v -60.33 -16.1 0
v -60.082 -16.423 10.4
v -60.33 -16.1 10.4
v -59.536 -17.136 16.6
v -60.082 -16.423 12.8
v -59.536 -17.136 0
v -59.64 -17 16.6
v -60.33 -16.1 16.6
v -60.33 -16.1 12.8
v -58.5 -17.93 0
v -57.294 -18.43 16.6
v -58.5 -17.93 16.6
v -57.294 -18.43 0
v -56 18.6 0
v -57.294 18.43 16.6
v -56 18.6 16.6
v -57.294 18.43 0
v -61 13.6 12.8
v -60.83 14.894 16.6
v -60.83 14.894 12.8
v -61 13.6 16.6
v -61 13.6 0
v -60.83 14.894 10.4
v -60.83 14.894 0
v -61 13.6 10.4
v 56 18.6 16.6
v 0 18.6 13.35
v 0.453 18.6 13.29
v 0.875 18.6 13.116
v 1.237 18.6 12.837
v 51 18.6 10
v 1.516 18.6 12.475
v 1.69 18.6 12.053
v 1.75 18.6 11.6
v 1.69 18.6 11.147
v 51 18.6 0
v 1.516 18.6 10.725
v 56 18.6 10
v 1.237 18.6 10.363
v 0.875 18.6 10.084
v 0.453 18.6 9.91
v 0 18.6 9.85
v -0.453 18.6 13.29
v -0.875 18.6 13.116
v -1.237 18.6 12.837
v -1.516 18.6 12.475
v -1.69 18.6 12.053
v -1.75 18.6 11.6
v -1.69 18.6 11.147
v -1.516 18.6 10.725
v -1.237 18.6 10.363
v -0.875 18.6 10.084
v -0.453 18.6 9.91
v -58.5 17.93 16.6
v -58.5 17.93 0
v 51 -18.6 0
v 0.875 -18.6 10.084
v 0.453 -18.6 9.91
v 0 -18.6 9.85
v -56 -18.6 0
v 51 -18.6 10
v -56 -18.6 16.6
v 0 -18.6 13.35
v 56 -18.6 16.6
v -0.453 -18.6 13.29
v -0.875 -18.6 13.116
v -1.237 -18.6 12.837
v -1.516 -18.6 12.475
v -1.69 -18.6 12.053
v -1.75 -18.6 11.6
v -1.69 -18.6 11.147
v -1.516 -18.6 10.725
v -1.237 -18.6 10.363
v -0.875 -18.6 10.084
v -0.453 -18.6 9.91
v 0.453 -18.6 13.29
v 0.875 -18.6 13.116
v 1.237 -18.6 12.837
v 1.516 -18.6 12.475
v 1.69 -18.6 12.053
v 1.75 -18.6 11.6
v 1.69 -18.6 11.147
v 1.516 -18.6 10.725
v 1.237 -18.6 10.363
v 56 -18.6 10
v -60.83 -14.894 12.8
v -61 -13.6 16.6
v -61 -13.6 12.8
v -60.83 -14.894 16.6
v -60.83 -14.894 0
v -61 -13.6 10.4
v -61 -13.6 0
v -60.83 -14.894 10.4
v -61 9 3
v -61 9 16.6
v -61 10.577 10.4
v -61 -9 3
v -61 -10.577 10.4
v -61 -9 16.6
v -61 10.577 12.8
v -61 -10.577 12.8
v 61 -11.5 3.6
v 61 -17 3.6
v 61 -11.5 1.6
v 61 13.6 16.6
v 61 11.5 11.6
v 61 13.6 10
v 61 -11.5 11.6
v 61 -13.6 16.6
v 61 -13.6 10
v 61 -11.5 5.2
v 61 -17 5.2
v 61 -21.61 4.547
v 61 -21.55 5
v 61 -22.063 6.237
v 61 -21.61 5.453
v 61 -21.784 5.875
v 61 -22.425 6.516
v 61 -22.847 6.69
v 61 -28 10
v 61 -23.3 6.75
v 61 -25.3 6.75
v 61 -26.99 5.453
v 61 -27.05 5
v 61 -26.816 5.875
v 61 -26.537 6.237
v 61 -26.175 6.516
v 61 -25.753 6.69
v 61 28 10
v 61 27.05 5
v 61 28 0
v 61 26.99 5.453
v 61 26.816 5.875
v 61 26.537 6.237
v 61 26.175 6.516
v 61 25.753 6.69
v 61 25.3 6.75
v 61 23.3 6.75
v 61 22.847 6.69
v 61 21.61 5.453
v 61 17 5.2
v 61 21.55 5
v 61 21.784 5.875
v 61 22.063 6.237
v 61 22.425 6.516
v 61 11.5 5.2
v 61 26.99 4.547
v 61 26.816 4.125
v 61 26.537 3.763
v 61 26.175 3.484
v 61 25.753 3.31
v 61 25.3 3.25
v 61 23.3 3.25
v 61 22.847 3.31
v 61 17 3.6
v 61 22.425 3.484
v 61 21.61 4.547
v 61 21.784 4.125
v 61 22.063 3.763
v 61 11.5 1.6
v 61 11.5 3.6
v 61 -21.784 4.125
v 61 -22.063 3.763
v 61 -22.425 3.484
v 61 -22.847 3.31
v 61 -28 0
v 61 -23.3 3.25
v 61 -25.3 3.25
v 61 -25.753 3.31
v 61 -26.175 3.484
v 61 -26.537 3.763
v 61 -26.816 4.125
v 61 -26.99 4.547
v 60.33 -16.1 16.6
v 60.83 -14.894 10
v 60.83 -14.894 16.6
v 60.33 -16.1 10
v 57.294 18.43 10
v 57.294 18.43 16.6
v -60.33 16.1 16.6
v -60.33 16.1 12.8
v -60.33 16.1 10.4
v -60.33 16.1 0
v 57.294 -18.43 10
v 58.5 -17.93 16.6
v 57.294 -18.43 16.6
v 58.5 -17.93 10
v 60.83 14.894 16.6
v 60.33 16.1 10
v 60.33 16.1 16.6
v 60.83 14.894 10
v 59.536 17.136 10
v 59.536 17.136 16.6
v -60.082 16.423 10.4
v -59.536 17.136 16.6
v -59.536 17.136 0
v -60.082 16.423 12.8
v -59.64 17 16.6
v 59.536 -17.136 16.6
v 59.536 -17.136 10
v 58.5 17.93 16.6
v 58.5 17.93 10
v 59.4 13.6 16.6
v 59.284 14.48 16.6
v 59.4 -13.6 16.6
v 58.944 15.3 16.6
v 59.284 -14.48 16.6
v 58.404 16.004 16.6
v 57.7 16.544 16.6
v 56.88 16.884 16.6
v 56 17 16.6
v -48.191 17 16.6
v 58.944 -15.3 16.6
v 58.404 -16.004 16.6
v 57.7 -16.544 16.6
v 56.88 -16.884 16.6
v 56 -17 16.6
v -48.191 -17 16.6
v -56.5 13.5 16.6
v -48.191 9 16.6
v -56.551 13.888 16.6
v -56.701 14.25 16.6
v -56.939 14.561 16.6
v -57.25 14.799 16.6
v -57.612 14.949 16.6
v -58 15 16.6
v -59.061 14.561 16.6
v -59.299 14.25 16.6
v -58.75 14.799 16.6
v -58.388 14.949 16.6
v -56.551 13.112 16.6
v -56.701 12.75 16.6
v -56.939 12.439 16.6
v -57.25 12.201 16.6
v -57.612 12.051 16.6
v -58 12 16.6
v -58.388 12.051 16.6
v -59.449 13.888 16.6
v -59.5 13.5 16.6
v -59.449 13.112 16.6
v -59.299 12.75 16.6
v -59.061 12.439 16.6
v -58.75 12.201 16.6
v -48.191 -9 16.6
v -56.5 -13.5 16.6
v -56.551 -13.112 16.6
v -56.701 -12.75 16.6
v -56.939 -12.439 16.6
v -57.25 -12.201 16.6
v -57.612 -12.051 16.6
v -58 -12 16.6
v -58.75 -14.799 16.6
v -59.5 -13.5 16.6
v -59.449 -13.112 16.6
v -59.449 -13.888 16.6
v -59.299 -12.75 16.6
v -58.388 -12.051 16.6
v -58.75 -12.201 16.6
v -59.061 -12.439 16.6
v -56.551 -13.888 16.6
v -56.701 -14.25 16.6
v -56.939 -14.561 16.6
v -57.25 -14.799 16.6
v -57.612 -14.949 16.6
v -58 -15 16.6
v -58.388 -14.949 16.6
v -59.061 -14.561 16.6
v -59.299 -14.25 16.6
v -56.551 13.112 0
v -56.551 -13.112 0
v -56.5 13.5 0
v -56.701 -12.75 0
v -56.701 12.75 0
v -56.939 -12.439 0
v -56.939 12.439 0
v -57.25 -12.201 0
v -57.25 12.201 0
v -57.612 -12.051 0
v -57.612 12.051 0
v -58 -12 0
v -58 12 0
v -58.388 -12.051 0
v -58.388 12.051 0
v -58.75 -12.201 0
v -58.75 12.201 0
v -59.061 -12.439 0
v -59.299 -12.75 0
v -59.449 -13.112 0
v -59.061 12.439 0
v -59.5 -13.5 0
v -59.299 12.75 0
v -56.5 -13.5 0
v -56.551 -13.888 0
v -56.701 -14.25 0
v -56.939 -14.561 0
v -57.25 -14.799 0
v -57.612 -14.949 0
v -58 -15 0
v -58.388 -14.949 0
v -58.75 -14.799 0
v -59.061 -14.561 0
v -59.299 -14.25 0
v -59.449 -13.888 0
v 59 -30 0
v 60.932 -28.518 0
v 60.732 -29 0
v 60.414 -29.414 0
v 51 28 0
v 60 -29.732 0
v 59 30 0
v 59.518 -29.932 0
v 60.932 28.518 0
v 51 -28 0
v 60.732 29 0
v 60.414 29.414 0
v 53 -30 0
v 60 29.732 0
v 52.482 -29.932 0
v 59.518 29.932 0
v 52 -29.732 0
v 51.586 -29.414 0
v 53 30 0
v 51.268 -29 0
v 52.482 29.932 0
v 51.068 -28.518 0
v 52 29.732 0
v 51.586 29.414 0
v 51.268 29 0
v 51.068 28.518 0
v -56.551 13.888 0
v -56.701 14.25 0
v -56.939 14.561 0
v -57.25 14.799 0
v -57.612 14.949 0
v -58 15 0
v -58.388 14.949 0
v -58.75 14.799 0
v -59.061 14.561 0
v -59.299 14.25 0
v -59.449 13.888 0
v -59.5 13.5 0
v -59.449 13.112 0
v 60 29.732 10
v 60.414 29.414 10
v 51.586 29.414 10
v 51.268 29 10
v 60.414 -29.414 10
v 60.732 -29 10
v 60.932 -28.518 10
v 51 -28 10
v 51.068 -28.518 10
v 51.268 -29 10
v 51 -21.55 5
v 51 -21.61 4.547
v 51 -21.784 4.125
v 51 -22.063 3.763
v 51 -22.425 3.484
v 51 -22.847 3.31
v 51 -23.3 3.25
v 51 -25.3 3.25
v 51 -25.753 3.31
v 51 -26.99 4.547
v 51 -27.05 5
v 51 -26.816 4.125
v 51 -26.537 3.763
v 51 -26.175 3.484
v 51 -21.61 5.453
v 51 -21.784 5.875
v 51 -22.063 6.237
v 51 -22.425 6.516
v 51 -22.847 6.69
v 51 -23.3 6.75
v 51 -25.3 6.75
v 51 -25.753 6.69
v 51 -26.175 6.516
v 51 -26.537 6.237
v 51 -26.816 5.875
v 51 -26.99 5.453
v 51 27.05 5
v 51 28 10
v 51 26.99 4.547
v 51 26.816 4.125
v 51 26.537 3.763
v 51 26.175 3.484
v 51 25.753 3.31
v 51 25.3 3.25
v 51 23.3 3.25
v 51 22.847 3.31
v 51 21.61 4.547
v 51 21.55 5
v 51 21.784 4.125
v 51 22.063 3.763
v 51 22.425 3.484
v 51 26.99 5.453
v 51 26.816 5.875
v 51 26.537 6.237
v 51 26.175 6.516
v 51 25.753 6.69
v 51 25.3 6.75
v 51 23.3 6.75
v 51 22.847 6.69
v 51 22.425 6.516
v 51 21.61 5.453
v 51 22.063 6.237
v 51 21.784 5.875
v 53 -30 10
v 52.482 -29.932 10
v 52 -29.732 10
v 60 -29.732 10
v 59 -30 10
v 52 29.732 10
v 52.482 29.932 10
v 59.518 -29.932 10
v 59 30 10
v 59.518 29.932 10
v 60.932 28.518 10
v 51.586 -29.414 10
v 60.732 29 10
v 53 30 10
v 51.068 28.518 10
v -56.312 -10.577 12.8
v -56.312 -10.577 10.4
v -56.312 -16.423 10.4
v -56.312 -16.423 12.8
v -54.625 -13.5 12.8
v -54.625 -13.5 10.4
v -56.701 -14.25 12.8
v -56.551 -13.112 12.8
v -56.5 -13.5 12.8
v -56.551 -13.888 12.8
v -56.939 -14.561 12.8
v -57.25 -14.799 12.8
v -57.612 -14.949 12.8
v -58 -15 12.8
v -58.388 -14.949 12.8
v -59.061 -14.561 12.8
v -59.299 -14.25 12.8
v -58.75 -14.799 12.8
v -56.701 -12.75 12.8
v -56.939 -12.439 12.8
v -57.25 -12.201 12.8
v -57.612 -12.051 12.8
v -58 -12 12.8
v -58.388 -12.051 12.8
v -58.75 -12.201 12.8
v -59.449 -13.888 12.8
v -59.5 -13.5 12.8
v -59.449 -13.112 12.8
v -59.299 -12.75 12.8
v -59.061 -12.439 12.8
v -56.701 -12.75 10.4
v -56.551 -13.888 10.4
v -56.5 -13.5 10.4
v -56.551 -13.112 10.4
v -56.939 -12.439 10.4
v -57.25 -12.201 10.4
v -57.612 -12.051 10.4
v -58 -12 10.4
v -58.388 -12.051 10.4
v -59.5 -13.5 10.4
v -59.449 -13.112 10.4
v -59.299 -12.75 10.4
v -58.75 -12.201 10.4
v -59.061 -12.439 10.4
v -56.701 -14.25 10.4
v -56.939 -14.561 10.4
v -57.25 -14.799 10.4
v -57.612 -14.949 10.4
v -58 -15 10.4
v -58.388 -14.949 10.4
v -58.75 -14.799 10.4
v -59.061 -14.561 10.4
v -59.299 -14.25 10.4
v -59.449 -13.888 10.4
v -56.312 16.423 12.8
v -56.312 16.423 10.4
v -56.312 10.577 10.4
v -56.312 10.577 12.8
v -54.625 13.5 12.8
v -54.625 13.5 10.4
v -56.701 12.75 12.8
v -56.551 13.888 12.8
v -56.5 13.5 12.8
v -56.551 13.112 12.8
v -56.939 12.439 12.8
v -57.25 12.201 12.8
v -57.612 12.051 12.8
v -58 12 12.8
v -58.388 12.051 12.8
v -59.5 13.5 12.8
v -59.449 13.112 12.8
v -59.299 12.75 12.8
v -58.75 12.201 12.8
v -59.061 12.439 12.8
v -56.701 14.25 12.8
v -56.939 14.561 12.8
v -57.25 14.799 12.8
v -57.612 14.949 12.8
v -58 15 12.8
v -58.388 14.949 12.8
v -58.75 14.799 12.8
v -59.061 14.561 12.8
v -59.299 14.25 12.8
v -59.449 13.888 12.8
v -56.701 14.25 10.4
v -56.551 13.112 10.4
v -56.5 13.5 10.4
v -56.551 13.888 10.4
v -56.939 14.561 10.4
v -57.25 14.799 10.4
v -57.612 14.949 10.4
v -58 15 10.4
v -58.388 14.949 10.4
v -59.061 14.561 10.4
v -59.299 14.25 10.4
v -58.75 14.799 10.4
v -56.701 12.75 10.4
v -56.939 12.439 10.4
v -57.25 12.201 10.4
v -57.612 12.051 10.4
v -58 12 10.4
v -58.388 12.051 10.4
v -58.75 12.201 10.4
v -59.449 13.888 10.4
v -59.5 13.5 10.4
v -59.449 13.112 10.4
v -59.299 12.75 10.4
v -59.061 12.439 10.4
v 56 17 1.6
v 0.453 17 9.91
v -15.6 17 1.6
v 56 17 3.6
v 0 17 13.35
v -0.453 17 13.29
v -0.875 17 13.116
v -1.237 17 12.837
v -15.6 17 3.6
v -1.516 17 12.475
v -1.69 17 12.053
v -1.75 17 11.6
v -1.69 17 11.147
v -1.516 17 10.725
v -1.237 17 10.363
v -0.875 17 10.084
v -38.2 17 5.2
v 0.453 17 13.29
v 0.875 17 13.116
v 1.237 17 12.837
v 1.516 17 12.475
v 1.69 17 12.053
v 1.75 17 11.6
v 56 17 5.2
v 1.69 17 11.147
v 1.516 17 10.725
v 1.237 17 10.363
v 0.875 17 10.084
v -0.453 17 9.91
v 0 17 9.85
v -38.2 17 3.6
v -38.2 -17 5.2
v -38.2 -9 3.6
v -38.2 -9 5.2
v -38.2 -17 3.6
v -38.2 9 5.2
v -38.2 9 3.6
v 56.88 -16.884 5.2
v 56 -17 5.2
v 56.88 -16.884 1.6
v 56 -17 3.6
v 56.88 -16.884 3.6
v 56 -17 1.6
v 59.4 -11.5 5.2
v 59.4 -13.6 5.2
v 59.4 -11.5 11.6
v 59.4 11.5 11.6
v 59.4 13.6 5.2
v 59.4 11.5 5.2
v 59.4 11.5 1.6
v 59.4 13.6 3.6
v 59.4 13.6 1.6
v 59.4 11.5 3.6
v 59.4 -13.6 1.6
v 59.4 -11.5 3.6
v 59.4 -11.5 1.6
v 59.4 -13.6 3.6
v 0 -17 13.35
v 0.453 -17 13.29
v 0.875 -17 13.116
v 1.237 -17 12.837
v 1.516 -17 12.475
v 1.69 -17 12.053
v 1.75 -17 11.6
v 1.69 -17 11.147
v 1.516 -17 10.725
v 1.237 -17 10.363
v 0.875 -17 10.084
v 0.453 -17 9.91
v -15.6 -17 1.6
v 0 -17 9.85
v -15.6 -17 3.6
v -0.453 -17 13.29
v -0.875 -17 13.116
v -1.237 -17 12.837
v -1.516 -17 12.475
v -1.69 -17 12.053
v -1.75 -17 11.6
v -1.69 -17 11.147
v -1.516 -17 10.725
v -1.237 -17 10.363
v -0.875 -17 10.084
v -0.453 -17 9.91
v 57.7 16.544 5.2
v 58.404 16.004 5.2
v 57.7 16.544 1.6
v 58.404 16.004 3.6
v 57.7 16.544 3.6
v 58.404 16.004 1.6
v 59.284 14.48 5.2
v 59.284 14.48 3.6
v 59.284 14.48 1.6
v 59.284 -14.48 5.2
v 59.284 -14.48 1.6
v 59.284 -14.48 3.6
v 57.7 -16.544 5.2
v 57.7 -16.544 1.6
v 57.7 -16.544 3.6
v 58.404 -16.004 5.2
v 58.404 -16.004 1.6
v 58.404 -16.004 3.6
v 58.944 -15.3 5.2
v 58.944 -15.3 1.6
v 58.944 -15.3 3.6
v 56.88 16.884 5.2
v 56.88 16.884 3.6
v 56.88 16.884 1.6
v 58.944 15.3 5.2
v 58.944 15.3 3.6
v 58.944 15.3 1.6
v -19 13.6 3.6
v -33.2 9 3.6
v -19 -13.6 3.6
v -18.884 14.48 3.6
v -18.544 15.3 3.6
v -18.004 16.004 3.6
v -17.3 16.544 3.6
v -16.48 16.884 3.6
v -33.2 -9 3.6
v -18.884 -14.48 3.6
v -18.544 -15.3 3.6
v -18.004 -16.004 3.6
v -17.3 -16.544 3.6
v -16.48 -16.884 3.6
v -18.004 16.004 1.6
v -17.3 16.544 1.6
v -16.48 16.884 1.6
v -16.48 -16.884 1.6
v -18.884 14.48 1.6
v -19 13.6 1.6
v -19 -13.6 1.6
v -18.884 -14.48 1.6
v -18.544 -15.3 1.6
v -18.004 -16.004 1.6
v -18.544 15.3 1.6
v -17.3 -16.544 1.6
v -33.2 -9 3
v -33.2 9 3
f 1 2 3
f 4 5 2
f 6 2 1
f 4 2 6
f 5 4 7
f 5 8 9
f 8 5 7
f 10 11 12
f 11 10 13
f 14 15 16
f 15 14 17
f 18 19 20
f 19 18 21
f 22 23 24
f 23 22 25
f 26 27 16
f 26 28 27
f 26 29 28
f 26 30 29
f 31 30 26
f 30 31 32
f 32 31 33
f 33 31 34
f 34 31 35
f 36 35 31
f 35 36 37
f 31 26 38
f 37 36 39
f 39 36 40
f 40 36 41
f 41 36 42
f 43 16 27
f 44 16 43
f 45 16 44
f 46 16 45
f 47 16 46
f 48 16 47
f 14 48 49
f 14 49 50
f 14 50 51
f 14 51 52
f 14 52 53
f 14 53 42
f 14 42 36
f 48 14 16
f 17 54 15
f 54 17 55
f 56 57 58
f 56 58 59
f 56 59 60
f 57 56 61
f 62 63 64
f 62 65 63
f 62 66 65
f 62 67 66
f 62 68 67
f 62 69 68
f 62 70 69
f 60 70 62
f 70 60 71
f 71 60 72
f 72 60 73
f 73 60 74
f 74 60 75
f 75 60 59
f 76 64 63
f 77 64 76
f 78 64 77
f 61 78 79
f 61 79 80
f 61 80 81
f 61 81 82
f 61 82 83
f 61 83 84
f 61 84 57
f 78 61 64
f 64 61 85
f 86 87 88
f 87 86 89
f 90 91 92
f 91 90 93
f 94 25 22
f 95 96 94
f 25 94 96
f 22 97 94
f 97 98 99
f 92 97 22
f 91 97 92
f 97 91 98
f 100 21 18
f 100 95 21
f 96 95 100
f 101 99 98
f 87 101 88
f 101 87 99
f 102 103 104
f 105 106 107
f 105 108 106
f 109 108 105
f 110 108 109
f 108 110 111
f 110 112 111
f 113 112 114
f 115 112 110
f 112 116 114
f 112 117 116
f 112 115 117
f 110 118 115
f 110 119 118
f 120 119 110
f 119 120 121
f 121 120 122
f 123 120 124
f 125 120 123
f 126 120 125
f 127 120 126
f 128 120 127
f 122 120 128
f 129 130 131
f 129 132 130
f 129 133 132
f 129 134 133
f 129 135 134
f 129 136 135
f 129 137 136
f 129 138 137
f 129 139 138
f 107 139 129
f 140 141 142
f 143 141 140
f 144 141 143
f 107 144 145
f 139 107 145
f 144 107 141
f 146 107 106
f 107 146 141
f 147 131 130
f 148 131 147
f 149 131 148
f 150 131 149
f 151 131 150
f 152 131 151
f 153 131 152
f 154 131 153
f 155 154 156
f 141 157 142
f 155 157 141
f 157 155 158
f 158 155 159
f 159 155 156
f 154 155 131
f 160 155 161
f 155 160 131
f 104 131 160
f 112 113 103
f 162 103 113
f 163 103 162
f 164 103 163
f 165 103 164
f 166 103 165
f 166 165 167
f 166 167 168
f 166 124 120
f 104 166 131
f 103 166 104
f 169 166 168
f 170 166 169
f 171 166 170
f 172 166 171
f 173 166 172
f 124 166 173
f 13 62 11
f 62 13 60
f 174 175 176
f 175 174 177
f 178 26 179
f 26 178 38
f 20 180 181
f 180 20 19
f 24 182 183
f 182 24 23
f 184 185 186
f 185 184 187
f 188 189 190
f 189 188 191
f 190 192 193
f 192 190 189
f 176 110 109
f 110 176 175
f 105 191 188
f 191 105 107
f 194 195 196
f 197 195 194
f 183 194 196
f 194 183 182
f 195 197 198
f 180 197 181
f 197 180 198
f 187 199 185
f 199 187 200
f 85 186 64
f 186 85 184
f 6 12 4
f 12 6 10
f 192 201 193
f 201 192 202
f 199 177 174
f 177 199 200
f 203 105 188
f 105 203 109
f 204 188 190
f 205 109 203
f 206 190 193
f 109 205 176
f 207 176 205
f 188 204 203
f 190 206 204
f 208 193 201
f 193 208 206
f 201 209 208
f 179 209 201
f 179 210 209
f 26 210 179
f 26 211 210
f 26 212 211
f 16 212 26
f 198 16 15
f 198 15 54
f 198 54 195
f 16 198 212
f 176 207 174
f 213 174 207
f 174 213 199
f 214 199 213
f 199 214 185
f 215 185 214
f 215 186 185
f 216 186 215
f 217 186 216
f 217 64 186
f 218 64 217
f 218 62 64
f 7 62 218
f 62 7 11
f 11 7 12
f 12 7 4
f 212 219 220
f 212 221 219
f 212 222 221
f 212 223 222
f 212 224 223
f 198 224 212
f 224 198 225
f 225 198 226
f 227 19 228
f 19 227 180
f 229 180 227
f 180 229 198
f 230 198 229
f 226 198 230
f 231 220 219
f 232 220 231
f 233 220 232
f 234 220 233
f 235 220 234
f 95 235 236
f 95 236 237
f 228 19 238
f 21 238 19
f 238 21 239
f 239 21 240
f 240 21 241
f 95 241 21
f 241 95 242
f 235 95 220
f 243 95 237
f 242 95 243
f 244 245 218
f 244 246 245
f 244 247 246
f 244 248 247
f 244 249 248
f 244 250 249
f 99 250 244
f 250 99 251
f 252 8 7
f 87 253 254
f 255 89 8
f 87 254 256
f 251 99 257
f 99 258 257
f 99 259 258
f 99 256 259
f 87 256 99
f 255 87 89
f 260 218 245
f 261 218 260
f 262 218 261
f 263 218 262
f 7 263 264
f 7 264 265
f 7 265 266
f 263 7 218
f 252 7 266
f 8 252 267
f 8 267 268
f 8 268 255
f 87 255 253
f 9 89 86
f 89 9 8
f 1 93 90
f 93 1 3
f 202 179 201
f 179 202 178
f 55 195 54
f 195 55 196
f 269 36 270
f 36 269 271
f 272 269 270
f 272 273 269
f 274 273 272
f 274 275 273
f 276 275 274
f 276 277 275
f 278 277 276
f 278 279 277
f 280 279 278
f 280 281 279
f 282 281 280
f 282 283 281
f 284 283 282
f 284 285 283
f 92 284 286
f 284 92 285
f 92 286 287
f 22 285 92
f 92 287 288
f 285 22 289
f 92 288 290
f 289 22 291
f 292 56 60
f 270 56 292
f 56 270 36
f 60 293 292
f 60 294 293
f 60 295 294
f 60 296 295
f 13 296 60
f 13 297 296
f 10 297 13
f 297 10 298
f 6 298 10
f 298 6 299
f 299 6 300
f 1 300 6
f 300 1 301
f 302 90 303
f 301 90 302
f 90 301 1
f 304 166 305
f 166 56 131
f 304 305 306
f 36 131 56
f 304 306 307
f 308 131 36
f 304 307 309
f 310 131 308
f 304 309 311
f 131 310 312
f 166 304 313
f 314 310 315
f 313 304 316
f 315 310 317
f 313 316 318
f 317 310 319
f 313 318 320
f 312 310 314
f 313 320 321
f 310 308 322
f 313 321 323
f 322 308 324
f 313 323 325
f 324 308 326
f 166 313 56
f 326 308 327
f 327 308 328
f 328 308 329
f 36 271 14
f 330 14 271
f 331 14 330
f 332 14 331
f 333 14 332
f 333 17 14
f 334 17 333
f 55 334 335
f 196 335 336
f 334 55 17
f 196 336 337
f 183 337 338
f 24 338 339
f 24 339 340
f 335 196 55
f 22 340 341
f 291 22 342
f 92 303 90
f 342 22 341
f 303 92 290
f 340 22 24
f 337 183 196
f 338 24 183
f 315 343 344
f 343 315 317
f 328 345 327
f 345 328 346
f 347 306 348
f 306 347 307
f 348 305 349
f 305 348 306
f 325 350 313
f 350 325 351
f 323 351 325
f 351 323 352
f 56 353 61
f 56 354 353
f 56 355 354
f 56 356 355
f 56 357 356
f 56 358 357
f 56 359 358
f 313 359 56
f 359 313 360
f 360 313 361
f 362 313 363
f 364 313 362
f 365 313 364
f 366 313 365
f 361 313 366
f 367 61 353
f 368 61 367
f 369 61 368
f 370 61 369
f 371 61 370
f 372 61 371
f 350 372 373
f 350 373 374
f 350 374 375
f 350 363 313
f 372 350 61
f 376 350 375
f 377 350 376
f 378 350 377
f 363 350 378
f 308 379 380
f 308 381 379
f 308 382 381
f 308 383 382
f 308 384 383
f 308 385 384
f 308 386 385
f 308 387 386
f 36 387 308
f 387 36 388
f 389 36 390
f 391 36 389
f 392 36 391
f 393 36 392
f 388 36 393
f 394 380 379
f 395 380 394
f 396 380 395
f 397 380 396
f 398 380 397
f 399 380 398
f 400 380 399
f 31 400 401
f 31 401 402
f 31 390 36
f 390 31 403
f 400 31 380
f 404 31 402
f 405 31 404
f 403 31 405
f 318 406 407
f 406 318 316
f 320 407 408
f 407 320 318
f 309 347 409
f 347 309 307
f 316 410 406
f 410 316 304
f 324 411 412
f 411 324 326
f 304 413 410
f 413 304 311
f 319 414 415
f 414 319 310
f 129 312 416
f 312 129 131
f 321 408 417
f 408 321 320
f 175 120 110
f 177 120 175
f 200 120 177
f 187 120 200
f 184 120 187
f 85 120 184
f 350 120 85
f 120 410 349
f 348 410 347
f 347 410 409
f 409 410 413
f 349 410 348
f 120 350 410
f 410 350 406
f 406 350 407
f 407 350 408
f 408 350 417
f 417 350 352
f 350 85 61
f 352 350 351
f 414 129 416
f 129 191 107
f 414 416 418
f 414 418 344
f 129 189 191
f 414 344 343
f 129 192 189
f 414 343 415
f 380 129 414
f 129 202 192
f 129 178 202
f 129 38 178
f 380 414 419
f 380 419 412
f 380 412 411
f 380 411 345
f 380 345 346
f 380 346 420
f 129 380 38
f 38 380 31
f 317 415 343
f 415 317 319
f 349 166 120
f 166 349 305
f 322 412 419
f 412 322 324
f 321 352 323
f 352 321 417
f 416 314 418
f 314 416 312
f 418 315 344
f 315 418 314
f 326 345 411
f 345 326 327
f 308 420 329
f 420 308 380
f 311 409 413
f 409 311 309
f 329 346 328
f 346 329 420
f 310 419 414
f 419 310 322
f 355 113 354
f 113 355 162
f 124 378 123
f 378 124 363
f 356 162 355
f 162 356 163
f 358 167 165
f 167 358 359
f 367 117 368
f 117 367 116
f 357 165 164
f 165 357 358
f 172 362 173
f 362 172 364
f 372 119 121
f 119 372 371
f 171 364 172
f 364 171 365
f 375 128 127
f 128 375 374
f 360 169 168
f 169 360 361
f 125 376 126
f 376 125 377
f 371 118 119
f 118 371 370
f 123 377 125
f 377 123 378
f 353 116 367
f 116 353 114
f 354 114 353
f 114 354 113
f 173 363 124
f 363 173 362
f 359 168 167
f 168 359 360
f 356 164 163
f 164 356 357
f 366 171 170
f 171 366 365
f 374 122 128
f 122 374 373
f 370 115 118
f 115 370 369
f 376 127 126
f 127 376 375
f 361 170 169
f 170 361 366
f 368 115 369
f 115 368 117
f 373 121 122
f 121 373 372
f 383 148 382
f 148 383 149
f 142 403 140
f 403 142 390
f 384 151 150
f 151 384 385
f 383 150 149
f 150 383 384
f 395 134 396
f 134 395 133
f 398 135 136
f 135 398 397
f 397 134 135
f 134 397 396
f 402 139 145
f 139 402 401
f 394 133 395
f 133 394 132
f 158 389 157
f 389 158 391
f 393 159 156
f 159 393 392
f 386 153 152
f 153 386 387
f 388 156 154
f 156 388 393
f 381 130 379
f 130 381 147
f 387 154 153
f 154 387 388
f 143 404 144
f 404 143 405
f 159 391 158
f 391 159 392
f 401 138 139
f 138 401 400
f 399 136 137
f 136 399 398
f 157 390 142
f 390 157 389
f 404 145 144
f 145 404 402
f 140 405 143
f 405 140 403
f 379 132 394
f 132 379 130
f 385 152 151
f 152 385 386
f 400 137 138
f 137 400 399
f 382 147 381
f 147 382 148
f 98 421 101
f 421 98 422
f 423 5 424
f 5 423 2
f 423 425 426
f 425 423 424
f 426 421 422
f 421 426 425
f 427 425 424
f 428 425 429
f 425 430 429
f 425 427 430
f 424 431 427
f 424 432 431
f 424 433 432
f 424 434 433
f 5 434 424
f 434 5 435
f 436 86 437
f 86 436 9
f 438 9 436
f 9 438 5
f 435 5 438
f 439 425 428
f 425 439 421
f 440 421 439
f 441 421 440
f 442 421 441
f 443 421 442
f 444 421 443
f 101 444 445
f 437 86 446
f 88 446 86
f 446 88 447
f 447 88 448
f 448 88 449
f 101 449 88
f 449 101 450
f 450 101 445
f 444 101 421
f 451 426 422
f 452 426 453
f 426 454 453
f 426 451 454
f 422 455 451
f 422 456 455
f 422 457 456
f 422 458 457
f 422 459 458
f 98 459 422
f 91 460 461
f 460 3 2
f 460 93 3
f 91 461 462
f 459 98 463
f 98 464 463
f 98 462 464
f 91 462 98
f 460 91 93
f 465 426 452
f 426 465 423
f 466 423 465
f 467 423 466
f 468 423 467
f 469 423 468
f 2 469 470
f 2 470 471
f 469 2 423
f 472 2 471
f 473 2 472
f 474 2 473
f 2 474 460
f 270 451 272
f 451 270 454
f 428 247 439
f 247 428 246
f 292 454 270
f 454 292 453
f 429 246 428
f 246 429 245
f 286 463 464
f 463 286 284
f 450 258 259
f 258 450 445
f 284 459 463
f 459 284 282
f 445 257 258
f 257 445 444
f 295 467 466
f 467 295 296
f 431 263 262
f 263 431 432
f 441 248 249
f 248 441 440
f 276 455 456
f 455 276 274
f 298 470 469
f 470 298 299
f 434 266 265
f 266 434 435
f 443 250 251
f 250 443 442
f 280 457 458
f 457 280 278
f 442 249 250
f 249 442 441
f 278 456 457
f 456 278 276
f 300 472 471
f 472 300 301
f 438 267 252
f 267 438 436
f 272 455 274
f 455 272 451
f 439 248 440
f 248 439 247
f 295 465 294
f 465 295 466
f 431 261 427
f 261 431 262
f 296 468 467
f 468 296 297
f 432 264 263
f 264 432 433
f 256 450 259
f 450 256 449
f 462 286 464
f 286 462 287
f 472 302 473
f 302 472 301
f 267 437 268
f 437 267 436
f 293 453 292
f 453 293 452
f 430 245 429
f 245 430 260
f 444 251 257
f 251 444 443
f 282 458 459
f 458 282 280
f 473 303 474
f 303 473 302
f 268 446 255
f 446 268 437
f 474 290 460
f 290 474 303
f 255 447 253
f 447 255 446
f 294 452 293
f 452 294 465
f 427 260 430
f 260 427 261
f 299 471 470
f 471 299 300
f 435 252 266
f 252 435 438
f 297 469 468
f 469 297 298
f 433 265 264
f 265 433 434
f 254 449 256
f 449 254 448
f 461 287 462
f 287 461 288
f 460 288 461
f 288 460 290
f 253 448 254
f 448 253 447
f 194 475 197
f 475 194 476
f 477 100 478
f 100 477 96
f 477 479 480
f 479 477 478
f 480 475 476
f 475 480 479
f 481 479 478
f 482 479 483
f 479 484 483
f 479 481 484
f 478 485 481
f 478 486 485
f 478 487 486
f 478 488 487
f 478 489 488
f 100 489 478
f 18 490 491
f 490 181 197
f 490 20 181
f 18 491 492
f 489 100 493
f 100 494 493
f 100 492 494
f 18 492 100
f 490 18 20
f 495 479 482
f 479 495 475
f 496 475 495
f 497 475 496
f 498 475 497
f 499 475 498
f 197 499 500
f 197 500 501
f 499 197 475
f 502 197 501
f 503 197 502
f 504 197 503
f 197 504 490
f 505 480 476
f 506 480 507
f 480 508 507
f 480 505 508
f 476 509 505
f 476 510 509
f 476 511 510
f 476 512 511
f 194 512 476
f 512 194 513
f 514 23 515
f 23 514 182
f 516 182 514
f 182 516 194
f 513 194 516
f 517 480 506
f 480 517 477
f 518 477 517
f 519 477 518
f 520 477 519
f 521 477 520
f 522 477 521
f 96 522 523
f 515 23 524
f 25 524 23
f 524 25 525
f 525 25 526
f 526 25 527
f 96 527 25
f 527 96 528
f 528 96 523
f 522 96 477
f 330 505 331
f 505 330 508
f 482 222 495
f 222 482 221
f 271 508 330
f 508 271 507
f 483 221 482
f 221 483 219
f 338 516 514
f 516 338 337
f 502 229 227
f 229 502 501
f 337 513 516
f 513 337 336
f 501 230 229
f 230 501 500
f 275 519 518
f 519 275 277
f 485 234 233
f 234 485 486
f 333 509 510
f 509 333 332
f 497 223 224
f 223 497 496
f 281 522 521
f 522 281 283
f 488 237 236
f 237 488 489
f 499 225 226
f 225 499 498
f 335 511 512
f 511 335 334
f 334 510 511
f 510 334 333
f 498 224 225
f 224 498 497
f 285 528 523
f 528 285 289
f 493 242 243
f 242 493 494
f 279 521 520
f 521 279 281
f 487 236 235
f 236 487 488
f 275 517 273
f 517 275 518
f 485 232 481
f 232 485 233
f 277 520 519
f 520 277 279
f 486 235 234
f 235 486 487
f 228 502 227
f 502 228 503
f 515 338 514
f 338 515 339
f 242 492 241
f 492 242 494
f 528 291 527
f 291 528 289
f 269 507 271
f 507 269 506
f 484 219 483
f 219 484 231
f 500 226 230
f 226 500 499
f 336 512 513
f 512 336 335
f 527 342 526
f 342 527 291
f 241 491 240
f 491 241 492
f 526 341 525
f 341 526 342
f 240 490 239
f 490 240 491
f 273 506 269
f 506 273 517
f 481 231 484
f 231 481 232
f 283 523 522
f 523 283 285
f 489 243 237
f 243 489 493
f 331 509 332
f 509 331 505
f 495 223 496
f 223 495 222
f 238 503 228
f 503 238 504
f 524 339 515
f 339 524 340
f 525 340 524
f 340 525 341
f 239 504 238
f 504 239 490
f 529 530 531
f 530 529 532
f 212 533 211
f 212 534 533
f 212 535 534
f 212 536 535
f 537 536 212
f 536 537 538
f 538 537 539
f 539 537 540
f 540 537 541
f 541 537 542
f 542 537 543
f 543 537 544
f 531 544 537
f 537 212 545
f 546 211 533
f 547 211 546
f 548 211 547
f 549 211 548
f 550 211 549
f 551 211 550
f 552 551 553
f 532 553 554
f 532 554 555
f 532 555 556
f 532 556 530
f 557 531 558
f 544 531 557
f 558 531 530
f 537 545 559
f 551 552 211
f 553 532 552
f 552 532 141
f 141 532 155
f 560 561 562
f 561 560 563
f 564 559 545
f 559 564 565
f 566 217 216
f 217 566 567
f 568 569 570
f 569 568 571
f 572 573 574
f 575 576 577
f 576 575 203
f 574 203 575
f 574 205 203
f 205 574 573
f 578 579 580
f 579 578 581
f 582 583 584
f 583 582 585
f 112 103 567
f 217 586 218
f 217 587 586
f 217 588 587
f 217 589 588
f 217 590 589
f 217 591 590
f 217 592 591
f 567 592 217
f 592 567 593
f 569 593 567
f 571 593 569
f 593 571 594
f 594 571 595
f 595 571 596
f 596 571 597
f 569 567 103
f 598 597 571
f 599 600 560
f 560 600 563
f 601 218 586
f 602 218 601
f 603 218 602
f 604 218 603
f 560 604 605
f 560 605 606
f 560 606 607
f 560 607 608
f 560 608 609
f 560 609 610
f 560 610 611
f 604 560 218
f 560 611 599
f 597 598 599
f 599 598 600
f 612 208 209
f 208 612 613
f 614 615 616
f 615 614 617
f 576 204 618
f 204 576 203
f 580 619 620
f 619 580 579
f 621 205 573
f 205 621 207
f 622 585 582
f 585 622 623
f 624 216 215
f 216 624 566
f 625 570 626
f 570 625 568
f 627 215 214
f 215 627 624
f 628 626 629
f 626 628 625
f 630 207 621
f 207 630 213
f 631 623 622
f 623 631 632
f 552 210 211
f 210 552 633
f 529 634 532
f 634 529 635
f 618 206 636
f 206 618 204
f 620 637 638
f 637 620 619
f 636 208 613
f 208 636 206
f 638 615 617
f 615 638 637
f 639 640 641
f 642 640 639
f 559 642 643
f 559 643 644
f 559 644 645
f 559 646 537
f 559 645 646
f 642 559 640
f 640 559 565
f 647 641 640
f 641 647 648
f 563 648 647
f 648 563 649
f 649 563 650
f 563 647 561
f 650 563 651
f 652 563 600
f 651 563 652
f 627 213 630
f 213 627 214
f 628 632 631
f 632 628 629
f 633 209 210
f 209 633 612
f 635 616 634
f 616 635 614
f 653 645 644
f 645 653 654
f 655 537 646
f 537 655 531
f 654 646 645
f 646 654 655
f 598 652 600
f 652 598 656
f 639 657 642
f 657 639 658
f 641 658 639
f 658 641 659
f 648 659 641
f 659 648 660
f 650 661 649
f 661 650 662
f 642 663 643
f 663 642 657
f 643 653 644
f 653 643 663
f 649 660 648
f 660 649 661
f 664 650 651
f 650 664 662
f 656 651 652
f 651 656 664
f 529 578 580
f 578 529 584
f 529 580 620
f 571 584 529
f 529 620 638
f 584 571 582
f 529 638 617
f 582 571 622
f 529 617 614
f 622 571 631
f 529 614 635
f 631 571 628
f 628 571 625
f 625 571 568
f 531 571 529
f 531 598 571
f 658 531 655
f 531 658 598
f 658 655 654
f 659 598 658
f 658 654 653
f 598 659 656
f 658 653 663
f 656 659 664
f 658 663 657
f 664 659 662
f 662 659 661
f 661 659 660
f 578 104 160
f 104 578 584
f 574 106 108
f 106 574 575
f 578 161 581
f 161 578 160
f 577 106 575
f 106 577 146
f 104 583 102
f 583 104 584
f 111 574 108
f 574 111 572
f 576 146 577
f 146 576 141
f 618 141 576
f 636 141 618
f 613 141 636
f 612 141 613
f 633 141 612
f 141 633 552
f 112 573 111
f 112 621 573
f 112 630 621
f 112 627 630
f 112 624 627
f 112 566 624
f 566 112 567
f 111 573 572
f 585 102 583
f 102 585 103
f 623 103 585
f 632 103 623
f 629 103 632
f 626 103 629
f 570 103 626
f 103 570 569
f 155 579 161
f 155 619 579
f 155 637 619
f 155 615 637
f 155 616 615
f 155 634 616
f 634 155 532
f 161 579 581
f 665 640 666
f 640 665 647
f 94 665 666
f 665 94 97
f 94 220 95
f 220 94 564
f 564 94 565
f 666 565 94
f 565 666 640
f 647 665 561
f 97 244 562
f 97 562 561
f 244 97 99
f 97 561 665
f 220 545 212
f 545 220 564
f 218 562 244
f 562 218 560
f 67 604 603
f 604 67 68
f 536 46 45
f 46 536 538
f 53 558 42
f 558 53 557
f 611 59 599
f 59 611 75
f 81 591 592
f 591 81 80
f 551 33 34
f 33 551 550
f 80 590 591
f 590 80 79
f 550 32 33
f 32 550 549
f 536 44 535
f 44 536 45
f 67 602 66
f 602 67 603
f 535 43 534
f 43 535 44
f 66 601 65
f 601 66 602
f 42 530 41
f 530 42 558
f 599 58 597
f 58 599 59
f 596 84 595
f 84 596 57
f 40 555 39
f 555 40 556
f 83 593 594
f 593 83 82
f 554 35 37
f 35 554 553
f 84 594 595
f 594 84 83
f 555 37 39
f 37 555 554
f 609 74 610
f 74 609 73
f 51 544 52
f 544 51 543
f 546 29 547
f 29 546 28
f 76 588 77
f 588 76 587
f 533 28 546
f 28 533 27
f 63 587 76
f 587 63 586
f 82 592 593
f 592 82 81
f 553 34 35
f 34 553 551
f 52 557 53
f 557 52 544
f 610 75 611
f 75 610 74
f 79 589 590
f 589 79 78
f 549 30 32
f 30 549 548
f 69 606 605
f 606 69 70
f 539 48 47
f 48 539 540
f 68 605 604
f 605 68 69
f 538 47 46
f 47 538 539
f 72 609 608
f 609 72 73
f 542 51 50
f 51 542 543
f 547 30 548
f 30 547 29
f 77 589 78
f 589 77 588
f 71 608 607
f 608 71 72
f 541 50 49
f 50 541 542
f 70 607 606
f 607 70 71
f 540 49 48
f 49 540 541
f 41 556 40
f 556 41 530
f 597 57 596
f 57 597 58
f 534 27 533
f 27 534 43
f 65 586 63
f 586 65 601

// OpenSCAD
// file: ../OpenSCAD_Modules/cube_vround.scad
module cube_vround(
	size=[10,10,10],
	round_corners=[true,true,true,true],
	rounding=3,
	center_xy=false,
	center_z=false,
	attach=0,
	wall_attach=0,
	quality=2, //integer from 1 to infinity
)
{
	assert(len(size)==3);
	assert(len(round_corners)==4);
	assert(rounding>0);
	assert(rounding<=size[0]/2);
	assert(rounding<=size[1]/2);
	assert(quality>0);
	assert(attach>=0);
	assert(wall_attach>=0);
	height=size[2]+attach;
	cyl_r=rounding+wall_attach;
	cyl_mvx=size[0]/2-rounding;
	cyl_mvy=size[1]/2-rounding;
	cube_szx=size[0]/2;
	cube_szy=size[1]/2;
	cube_mvx=cube_szx/2+wall_attach;
	cube_mvy=cube_szy/2+wall_attach;
	translate([center_xy?0:cube_szx,center_xy?0:cube_szy,center_z?-attach/2:(size[2]-attach)/2])
		hull()
		{
			if(round_corners[0])
				translate([cyl_mvx,cyl_mvy])
					cylinder(r=cyl_r,h=height,$fn=12*quality,center=true);
			else
				translate([cube_mvx,cube_mvy])
					cube([cube_szx,cube_szy,height],center=true);
			if(round_corners[1])
				translate([cyl_mvx,-cyl_mvy])
					cylinder(r=cyl_r,h=height,$fn=12*quality,center=true);
			else
				translate([cube_mvx,-cube_mvy])
					cube([cube_szx,cube_szy,height],center=true);
			if(round_corners[2])
				translate([-cyl_mvx,-cyl_mvy])
					cylinder(r=cyl_r,h=height,$fn=12*quality,center=true);
			else
				translate([-cube_mvx,-cube_mvy])
					cube([cube_szx,cube_szy,height],center=true);
			if(round_corners[3])
				translate([-cyl_mvx,cyl_mvy])
					cylinder(r=cyl_r,h=height,$fn=12*quality,center=true);
			else
				translate([-cube_mvx,cube_mvy])
					cube([cube_szx,cube_szy,height],center=true);
		};
}

//example
cube_vround(round_corners=[true,false,true,false],
size=[10,20,6],
attach=0.1,
wall_attach=0.1,
rounding=3,
center_xy=true,center_z=false);
// main file
use <../OpenSCAD_Modules/cube_vround.scad>

module HNutPocket
(
	nutDiam=6.75,
	nutHeight=2.4,
	pocketLen=100,
)
{
	m=(nutDiam/2)*sqrt(3)/2;
	union()
	{
		cylinder(d=nutDiam,h=nutHeight,center=true,$fn=6);
		translate([pocketLen/2,0,0])
		cube(size=[pocketLen,m*2,nutHeight],center=true);
	}
}

module Case
(
	ext_size=[122,16.6],
	front_clip_size=[10,60,10,3.5,1,2],
	wall_size=1.6,
	base_size=1.6,
	pcb_size=[99.2,34],
	pcb_cut=[2,80,23,10,1.6,10],
	eth_cut=[18,13.6,0.6],
	screw_size=3,
	screw_diff=[27,3],
	side_screw_size=3.5,
	side_screw_shift=[0,5],
	nut_size=6,
	nut_shift=10,
	quality=2,
)
{
	cutClr=5;
	cutSmall=0.01;
	rounding=5;
	int_rounding=rounding-wall_size;

	difference()
	{
		union()
		{
			//base
			cube_vround(size=[ext_size[0],pcb_size[1]+2*wall_size,ext_size[1]],
				center_xy=true,quality=quality,rounding=rounding);
			translate([ext_size[0]/2-front_clip_size[0]/2,0,0])
			cube_vround(size=[front_clip_size[0],front_clip_size[1],front_clip_size[2]],
				center_xy=true,quality=quality,rounding=front_clip_size[5]);
		}
		//front clip scew cuts
		for(i=[-1:2:1])
		{
			holeCenter=(front_clip_size[1]/2-pcb_size[1]/2-wall_size)/2+pcb_size[1]/2+wall_size;
			hull()
			for(s=[-1:2:1])
			{
				translate([ext_size[0]/2-front_clip_size[0]/2,i*holeCenter+s*front_clip_size[4],front_clip_size[2]/2])
				rotate(a=90,v=[0,1,0])
				cylinder(d=front_clip_size[3],h=front_clip_size[0]+2*cutClr,center=true,$fn=12*quality);
			}
		}
		//main pcb cut
		translate([ext_size[0]/2-pcb_size[0]/2-wall_size/2,0,base_size+pcb_cut[0]])
		cube_vround(size=[pcb_size[0]-wall_size,pcb_size[1],ext_size[1]+cutClr],round_corners=[true,true,false,false],
			center_xy=true,quality=quality,rounding=int_rounding);
		//pcb cut 1
		translate([ext_size[0]/2-pcb_cut[1]/2-wall_size/2,0,base_size])
		cube_vround(size=[pcb_cut[1]-wall_size,pcb_size[1],pcb_cut[0]+cutClr],
				center_xy=true,quality=quality,rounding=int_rounding);
		//pcb cut 2
		translate([ext_size[0]/2-wall_size/2,0,base_size+pcb_cut[3]/2])
		cube(size=[wall_size+2*cutClr,pcb_cut[2],pcb_cut[3]],center=true);
		//pcb cut 3
		translate([ext_size[0]/2-wall_size/2,0,base_size+pcb_cut[4]/2+pcb_cut[0]])
		cube(size=[wall_size+2*cutClr, pcb_size[1], pcb_cut[4]],center=true);
		//eth board cut 1
		ethBackCut=ext_size[0]-pcb_size[0];
		translate([-ext_size[0]/2+ethBackCut/2,0,base_size+eth_cut[1]/2+cutClr/2+pcb_cut[0]-eth_cut[2]])
		cube(size=[ethBackCut+2*cutClr,eth_cut[0],eth_cut[1]+cutClr],center=true);
		//eth board cut 2 (pcb top)
		translate([-ext_size[0]/2+ethBackCut/2,0,base_size+eth_cut[1]+pcb_cut[0]-eth_cut[2]+ext_size[1]/2])
		cube(size=[ethBackCut+2*cutClr,pcb_size[1],ext_size[1]],center=true);
		//eth screw holes
		for(i=[-1:2:1])
		{
			translate([-ext_size[0]/2+screw_diff[1],i*screw_diff[0]/2,base_size])
			{
				translate([0,0,nut_shift])
				rotate(a=180,v=[0,0,1])
				HNutPocket();
				cylinder(d=screw_size,h=2*ext_size[1],$fn=12*quality,center=true);
			}
		}
		//eth back cut for ease of insertion of main pcb
		rotate(a=90,v=[1,0,0])
		linear_extrude(height=pcb_size[1],center=true)
		polygon(points=[
			[0,base_size+pcb_cut[0]+pcb_cut[4]],
			[-ext_size[0]/2+ethBackCut,base_size+pcb_cut[0]+pcb_cut[4]],
			[-ext_size[0]/2+ethBackCut-pcb_cut[5],ext_size[1]+cutSmall],
			[0,ext_size[1]+cutSmall],
		]);
		//eth side clip screw hole
		translate([side_screw_shift[0],0,ext_size[1]-side_screw_shift[1]])
		rotate(a=90,v=[1,0,0])
		cylinder(d=side_screw_size,h=pcb_size[1]+2*wall_size+2*cutClr,$fn=12*quality,center=true);
	}
}

Case();
